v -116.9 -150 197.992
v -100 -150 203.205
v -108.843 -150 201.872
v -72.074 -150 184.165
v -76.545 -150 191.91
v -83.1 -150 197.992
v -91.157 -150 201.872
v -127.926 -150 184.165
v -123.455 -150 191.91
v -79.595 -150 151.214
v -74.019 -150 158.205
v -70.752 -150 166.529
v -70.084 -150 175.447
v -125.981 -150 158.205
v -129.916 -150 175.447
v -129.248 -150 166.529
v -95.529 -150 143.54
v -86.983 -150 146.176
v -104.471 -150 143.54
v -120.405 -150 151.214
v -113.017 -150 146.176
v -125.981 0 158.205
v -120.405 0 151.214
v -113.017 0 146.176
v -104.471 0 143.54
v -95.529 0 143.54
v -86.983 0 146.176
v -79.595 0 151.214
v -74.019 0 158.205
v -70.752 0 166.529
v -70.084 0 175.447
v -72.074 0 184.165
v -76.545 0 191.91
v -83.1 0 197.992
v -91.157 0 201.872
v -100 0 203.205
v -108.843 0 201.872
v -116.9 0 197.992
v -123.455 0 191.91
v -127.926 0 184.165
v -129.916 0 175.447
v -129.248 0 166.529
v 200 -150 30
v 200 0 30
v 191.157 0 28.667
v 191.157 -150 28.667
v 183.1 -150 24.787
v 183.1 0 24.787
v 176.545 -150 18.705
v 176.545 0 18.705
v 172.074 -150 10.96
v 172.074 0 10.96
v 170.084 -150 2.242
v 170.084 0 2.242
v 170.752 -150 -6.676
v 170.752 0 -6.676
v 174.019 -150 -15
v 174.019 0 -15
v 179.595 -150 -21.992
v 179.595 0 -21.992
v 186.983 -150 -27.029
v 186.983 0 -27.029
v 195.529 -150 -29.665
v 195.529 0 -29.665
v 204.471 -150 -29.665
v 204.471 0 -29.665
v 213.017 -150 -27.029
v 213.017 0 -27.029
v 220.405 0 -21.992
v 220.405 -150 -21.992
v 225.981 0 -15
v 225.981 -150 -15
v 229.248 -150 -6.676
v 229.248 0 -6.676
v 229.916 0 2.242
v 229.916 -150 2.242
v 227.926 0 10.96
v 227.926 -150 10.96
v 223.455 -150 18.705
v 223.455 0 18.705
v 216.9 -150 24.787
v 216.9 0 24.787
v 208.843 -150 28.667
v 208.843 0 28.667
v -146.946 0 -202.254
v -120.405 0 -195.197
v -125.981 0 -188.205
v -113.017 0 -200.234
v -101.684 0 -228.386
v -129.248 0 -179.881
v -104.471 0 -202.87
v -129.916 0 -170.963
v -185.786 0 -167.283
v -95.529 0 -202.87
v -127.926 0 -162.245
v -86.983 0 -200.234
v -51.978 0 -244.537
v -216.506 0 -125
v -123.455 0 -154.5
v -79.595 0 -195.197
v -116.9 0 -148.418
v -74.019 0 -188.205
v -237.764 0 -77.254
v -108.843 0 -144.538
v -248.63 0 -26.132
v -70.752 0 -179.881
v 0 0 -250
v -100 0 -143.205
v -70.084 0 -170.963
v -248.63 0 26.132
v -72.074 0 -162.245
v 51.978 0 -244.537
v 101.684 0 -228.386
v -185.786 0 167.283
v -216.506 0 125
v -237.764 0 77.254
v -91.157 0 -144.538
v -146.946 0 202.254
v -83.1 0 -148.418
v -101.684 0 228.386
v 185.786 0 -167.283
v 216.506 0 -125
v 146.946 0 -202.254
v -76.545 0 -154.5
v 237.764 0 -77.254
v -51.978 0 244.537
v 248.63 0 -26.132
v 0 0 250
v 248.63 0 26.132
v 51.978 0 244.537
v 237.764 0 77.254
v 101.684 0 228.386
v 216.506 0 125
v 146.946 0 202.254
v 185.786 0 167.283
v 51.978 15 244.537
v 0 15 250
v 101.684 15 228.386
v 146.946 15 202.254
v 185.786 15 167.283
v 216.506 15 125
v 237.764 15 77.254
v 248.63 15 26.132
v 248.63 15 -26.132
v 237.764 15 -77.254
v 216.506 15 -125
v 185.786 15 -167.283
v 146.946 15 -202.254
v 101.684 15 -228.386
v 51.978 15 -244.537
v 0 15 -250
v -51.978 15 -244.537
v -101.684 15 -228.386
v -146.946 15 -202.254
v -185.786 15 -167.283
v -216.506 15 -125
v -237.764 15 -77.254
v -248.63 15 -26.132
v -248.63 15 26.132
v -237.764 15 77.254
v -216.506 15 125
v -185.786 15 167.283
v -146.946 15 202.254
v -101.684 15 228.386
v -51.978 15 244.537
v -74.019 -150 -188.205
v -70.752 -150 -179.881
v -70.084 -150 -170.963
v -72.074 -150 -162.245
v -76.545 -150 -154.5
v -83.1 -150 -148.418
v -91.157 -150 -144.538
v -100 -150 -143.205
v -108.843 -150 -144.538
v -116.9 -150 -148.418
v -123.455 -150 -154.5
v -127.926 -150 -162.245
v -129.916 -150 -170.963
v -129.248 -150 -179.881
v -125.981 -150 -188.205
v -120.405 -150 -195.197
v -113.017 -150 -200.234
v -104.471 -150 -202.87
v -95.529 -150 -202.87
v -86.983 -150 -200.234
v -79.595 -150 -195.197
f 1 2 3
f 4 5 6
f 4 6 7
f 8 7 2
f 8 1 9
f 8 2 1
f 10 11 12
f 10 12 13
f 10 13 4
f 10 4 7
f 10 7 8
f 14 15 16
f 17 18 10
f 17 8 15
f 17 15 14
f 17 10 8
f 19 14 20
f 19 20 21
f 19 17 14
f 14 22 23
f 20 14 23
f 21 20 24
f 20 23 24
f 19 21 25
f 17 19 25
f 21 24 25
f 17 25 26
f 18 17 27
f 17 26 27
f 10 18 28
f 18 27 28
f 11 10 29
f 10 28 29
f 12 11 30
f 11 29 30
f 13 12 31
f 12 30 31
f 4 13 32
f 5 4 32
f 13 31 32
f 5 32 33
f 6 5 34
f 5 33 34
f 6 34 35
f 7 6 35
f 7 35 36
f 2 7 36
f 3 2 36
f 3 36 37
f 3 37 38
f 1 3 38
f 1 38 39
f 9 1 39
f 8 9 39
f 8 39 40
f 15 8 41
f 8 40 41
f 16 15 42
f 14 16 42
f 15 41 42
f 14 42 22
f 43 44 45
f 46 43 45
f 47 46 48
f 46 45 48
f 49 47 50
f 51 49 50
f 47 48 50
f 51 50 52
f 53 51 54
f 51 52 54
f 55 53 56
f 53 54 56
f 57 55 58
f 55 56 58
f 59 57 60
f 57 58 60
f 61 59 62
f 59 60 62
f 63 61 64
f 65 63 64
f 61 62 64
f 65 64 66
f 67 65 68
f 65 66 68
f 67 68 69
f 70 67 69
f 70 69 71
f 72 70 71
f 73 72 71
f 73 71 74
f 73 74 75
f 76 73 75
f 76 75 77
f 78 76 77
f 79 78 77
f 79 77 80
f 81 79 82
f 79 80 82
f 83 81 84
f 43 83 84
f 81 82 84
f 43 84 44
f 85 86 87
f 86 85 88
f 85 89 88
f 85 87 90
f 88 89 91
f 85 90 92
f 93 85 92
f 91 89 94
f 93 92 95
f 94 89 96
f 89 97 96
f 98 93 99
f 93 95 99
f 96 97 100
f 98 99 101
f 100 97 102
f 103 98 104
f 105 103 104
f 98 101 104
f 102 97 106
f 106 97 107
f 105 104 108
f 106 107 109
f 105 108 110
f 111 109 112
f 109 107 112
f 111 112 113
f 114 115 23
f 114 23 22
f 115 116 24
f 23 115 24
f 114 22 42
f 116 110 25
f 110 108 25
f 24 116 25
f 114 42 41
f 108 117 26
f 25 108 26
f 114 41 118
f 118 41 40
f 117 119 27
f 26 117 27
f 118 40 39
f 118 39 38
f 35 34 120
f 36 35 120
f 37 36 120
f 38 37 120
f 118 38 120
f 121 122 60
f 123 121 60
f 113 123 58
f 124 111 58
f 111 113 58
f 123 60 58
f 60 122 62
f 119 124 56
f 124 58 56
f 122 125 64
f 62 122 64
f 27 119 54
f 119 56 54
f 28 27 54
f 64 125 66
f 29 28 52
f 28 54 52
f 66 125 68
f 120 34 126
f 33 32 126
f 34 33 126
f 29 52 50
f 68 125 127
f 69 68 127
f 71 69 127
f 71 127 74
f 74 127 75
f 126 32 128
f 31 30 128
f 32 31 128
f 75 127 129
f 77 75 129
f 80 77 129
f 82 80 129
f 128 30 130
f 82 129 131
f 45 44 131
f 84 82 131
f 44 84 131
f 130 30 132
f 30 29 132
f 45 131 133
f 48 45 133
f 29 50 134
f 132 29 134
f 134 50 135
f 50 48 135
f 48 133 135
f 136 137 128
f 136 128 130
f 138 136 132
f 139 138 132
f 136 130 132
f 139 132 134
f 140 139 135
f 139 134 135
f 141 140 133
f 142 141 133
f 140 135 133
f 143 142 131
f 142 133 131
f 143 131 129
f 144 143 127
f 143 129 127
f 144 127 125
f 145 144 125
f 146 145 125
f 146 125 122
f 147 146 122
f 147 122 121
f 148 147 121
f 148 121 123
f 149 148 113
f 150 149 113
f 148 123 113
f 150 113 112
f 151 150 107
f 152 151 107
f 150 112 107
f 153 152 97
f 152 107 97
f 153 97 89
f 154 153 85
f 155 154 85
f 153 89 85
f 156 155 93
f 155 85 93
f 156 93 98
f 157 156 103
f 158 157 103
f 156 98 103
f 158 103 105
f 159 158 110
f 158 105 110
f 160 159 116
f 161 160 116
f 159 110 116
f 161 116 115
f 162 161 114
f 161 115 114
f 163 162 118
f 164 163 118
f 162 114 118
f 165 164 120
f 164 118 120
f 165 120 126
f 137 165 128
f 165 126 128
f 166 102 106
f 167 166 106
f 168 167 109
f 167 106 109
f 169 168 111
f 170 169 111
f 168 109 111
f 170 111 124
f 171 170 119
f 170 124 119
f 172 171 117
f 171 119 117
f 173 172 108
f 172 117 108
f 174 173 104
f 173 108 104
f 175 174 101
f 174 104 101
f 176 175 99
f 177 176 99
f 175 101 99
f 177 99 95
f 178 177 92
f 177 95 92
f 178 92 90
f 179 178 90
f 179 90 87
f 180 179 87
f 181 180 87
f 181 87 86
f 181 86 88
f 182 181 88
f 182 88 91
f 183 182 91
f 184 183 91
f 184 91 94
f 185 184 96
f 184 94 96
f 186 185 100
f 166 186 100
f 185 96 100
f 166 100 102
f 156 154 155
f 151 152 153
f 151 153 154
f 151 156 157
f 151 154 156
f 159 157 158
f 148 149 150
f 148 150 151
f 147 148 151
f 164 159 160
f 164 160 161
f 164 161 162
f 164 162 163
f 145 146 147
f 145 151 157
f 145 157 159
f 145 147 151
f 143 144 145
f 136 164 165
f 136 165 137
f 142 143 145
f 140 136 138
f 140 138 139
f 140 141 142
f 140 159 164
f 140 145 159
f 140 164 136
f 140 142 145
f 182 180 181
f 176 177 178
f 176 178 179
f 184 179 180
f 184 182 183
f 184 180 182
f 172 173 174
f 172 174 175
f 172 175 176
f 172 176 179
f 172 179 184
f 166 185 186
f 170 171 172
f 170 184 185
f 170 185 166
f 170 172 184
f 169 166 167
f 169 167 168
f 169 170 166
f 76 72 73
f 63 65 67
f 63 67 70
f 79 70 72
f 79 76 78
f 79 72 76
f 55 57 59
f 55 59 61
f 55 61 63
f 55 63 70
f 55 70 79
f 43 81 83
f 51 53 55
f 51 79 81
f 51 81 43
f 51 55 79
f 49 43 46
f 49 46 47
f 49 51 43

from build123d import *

# Parameters (mm, degrees)
SKETCH1_R           = 250
BOSS_EXTRUDE1_DEPTH = 15
SKETCH2_R           = 30
BOSS_EXTRUDE2_DEPTH = 150
CIRPATTERN1_COUNT   = 3


with BuildPart() as part:
    # Sketch1 → Boss-Extrude1 (new body)
    with BuildSketch(Plane(origin=(0, 0, 0), x_dir=(1, 0, 0), z_dir=(0, 1, 0))):
        with Locations(Location((0, 0, 0), (0, 0, 270))):
            Circle(SKETCH1_R)
    extrude(amount=BOSS_EXTRUDE1_DEPTH)

    # Sketch2 → Boss-Extrude2 (add)
    with BuildSketch(Plane.XZ):
        with Locations(Location((200, 0, 0), (0, 0, 90))):
            Circle(SKETCH2_R)
    boss_extrude2 = extrude(amount=BOSS_EXTRUDE2_DEPTH)

    # CirPattern1: Boss-Extrude2 ×3 about axis
    cirpattern1_axis = Axis((0, 0, 0), (0, 1, 0))
    for i in range(1, CIRPATTERN1_COUNT):
        add(boss_extrude2.rotate(cirpattern1_axis, i * 360 / CIRPATTERN1_COUNT))


solid = part.part
